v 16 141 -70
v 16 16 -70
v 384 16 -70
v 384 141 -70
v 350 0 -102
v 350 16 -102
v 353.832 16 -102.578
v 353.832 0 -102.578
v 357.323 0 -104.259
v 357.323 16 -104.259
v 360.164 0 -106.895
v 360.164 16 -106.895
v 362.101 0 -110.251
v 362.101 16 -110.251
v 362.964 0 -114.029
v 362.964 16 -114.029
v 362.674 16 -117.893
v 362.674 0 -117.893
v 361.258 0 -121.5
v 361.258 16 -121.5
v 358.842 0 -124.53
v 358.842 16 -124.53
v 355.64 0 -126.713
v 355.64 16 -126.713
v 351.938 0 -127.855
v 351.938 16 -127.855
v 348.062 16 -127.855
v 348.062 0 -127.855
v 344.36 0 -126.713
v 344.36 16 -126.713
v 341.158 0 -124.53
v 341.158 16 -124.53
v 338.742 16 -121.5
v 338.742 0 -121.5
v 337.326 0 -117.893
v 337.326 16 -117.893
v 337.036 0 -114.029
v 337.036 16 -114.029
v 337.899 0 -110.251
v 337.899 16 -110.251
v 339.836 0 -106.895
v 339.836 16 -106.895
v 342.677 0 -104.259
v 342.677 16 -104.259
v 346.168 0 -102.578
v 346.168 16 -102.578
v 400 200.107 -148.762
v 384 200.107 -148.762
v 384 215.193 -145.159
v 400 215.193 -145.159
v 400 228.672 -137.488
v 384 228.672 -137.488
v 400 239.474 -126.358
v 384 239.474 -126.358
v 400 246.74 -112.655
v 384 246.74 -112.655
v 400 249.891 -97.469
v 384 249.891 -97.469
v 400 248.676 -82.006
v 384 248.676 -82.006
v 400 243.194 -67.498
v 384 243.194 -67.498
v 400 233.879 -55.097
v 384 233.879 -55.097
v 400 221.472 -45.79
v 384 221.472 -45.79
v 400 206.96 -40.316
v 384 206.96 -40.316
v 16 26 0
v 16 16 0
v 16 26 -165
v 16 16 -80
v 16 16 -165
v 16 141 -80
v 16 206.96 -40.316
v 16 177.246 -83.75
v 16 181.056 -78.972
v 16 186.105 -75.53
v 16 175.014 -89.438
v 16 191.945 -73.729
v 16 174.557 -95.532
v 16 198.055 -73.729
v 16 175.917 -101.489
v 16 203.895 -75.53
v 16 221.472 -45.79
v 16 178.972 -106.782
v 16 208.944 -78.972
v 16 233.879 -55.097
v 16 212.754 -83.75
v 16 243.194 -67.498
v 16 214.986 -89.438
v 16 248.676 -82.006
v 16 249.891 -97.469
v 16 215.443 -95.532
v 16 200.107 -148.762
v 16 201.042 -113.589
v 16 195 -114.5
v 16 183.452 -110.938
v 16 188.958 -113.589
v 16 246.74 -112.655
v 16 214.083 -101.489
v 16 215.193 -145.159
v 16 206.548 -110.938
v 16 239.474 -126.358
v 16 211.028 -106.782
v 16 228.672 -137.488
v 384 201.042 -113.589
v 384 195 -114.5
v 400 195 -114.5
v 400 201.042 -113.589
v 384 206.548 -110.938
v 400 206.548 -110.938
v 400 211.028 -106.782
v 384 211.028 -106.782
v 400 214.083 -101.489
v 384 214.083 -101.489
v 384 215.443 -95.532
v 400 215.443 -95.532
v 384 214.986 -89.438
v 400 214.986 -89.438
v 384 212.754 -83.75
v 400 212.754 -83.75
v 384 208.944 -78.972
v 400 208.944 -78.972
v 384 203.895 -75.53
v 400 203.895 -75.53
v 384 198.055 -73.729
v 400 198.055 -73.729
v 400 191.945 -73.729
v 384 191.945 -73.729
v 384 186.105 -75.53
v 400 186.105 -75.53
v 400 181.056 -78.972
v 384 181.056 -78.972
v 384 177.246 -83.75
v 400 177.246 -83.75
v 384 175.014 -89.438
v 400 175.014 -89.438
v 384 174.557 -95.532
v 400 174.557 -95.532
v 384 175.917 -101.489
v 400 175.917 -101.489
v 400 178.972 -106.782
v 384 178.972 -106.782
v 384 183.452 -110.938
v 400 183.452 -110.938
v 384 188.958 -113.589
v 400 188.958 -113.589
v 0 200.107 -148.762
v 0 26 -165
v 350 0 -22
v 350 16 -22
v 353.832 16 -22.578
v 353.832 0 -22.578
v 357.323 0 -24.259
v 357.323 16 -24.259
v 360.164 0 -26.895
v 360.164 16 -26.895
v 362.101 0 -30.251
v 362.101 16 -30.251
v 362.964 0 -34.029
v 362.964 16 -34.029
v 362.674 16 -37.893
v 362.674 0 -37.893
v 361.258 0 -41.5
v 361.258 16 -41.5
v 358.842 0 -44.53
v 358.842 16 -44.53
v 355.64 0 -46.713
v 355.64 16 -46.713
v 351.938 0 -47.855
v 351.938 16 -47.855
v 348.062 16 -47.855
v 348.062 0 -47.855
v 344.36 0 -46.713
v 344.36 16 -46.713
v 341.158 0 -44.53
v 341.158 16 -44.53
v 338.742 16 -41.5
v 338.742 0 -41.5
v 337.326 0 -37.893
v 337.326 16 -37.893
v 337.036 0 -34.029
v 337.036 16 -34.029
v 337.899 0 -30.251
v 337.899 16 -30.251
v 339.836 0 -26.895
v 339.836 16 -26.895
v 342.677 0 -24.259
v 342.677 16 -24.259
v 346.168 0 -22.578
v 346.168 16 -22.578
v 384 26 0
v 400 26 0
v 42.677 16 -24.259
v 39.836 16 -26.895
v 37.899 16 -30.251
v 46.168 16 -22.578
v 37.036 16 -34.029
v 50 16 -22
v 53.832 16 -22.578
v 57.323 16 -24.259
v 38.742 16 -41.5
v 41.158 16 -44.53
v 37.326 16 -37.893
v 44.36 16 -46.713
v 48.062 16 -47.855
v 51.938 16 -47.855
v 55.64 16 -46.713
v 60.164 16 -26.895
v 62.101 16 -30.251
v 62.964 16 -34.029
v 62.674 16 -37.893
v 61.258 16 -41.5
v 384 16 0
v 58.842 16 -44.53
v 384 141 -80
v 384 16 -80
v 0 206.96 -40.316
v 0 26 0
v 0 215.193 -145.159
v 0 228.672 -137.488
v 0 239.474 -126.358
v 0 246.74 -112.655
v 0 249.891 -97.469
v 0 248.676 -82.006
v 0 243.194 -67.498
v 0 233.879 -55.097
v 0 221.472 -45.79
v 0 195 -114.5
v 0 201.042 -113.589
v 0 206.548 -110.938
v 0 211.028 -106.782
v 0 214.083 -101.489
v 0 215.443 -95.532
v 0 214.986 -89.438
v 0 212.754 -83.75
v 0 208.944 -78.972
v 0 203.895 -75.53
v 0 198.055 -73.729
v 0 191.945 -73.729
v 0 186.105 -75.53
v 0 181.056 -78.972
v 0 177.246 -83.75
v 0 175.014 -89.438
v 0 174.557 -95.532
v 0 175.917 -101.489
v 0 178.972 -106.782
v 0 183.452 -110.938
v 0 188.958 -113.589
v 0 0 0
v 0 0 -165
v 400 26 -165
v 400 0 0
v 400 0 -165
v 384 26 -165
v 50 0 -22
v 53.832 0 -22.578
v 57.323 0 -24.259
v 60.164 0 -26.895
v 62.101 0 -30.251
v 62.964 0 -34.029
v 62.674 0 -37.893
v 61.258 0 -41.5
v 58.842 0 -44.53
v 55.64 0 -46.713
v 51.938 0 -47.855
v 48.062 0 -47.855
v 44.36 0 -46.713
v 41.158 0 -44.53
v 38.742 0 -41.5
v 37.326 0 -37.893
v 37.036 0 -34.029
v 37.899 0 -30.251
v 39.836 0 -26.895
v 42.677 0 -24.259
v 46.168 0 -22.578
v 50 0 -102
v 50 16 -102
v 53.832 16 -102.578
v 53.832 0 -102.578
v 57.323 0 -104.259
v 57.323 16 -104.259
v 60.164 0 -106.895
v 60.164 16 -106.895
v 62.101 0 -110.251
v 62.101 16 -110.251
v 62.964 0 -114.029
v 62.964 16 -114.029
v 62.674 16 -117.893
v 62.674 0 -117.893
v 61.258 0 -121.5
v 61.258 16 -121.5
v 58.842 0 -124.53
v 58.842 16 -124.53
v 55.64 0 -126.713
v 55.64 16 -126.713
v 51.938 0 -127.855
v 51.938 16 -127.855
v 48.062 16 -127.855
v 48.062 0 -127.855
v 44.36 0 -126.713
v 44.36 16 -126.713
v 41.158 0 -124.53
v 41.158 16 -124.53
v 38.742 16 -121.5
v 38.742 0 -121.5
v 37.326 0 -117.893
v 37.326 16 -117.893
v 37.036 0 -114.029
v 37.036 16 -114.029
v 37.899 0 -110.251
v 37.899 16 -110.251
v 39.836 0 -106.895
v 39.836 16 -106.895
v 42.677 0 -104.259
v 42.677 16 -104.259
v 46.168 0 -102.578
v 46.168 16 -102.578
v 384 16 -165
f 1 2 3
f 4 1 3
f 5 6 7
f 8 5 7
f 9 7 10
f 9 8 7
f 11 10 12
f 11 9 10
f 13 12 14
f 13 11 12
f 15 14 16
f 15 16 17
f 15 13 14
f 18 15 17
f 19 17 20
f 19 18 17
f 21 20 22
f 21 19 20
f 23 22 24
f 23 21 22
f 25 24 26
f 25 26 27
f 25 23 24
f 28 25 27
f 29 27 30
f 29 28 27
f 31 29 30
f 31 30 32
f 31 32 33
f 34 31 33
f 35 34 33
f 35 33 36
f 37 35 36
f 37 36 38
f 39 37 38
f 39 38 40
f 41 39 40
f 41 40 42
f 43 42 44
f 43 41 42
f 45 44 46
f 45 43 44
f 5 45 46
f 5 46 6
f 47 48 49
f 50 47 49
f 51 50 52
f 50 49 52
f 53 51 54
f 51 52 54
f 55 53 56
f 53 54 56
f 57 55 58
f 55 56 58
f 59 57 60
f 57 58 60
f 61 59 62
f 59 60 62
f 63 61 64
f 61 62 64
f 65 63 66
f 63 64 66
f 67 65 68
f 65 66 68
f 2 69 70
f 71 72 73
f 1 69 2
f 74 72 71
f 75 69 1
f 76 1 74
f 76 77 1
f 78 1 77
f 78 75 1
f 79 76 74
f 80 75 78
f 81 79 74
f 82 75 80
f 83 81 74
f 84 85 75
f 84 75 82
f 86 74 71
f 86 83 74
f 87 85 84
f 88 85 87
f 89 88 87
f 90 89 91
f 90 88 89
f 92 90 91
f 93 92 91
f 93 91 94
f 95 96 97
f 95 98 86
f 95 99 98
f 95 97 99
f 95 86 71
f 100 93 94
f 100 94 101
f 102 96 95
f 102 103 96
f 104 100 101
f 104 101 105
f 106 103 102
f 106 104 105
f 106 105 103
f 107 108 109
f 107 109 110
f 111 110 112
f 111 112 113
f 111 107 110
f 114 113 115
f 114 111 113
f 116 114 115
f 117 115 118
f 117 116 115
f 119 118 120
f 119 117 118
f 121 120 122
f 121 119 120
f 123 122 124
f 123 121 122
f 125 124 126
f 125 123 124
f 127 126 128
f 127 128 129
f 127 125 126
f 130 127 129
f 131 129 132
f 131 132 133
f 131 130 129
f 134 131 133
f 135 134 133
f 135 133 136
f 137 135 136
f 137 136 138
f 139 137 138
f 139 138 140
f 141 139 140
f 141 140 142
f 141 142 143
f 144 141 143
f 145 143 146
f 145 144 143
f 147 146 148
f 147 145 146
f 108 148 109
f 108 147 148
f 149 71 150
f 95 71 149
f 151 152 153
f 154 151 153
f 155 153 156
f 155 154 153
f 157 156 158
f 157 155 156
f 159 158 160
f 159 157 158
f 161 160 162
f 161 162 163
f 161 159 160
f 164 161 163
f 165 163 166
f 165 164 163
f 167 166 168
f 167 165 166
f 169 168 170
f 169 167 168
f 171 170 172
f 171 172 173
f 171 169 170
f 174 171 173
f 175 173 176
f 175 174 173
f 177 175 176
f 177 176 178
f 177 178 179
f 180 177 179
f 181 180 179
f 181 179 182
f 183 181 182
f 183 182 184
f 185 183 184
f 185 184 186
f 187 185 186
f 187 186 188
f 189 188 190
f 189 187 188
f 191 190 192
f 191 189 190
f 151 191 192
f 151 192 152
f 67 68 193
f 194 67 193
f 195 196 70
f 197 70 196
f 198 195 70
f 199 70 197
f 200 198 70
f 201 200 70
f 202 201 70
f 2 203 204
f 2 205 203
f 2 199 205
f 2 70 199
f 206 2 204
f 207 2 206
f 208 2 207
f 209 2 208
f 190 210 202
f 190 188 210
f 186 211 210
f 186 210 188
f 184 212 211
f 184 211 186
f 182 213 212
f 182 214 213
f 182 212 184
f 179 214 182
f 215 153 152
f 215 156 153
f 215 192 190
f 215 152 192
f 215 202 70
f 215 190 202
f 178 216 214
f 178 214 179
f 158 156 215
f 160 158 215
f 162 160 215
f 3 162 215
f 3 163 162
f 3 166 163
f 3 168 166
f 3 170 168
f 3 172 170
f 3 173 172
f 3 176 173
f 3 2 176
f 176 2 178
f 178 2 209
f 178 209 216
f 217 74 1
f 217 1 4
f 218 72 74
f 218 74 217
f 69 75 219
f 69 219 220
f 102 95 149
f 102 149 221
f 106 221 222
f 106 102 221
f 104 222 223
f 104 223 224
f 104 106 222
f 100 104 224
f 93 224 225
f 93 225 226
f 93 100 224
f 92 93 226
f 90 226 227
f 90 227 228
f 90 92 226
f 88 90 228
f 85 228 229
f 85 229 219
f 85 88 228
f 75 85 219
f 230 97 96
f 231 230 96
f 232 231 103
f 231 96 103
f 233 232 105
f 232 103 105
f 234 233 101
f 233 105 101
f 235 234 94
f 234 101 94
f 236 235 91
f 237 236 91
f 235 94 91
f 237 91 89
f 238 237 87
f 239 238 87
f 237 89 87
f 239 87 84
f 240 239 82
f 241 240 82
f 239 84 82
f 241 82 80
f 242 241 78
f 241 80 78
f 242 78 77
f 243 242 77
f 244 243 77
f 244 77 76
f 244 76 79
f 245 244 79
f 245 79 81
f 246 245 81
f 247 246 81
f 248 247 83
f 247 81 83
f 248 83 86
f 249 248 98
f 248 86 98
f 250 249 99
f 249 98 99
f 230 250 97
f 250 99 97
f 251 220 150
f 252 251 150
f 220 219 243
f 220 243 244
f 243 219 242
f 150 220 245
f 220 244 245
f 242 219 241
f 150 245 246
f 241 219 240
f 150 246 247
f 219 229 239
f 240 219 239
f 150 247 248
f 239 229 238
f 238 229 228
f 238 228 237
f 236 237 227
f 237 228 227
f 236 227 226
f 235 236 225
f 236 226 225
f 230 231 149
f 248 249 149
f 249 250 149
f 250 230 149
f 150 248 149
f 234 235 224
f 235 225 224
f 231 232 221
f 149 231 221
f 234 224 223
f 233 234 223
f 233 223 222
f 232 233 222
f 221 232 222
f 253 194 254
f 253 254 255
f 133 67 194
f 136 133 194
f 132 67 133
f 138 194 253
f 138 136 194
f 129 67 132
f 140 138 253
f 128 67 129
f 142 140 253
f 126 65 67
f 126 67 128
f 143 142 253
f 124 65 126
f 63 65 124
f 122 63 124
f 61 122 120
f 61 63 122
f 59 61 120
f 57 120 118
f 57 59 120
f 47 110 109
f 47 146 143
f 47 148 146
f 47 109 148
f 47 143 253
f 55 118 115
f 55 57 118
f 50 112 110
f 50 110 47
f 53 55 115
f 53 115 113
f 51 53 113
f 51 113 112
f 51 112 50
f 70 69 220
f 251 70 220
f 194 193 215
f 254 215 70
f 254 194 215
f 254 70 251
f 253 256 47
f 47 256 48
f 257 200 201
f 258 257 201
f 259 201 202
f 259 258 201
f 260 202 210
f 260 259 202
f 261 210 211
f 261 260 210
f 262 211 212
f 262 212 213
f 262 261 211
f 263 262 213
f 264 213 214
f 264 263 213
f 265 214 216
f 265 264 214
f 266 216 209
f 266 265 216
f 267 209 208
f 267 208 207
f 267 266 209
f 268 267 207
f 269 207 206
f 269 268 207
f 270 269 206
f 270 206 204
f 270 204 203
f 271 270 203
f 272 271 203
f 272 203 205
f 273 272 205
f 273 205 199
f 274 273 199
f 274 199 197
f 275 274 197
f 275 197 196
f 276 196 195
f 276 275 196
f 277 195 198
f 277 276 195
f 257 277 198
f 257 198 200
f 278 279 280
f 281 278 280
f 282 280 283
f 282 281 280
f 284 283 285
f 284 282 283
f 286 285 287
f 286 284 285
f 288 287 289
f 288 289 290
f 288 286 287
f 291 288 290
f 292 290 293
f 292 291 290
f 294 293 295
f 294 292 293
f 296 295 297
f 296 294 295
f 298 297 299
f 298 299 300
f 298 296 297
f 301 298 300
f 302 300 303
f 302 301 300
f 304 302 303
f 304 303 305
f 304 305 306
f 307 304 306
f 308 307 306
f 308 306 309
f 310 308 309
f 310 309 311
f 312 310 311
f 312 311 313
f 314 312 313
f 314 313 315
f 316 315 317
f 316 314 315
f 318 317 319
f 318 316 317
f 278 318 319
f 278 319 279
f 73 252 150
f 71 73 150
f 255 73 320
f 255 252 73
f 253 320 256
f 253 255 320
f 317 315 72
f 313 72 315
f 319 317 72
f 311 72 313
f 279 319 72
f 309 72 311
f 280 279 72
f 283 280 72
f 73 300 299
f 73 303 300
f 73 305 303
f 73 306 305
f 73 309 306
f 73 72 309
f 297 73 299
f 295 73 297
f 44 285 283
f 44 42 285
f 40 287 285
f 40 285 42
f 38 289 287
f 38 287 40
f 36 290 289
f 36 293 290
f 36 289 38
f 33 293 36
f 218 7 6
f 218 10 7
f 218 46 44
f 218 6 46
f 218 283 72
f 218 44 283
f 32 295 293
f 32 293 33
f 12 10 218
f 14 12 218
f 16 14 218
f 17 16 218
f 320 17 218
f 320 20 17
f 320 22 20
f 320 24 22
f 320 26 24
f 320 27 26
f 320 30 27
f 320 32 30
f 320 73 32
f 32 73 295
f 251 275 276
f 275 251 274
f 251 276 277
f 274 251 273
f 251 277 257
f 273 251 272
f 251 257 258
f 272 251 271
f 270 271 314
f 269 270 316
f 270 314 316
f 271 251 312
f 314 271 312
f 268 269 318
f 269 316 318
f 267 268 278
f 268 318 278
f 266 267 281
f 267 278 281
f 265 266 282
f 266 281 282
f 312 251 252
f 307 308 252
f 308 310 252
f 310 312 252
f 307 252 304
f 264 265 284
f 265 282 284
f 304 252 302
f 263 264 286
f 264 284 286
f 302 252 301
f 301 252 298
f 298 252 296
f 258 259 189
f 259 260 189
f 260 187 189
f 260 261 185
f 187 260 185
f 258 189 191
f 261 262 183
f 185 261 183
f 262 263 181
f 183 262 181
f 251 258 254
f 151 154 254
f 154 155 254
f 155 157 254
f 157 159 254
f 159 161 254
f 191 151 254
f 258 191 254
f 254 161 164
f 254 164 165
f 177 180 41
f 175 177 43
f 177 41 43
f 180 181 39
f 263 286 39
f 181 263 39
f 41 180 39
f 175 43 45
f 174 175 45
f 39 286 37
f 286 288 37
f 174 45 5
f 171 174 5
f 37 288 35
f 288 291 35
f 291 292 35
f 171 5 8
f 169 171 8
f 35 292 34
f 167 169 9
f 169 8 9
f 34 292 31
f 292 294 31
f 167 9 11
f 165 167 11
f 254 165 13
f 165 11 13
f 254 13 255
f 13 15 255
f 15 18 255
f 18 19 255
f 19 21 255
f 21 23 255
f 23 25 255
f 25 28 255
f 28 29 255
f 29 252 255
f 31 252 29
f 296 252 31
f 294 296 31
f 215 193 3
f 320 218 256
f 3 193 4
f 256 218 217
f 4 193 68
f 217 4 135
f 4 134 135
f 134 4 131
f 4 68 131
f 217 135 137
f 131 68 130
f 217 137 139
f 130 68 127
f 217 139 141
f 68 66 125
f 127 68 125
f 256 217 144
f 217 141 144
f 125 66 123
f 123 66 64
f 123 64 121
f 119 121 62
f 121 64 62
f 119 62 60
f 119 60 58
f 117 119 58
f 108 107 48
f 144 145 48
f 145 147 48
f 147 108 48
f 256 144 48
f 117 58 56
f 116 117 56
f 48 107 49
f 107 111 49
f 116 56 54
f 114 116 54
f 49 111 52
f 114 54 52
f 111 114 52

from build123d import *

# Parameters (mm, degrees)
SKETCH_1_W      = 400
SKETCH_1_H      = 165
SKETCH_1_R      = 13
EXTRUDE_1_DEPTH = 16
SKETCH_2_W      = 368
SKETCH_2_H      = 10
EXTRUDE_2_DEPTH = 125
SKETCH_3_R      = 20.5
EXTRUDE_3_DEPTH = 16


with BuildPart() as part:
    # 草图1 → 凸台-拉伸1 (new body)
    with BuildSketch(Plane(origin=(0, 0, 0), x_dir=(1, 0, 0), z_dir=(0, 1, 0))):
        with Locations((200, 82.5)):
            Rectangle(SKETCH_1_W, SKETCH_1_H)
        with Locations(Location((350, 115, 0), (0, 0, 270))):
            Circle(SKETCH_1_R, mode=Mode.SUBTRACT)
        with Locations(Location((50, 115, 0), (0, 0, 270))):
            Circle(SKETCH_1_R, mode=Mode.SUBTRACT)
        with Locations(Location((50, 35, 0), (0, 0, 270))):
            Circle(SKETCH_1_R, mode=Mode.SUBTRACT)
        with Locations(Location((350, 35, 0), (0, 0, 270))):
            Circle(SKETCH_1_R, mode=Mode.SUBTRACT)
    extrude(amount=EXTRUDE_1_DEPTH)

    # 草图2 → 凸台-拉伸2 (add)
    with BuildSketch(Plane(origin=(0, 16, 0), x_dir=(1, 0, 0), z_dir=(0, 1, 0))):
        with Locations((200, 75)):
            Rectangle(SKETCH_2_W, SKETCH_2_H)
    extrude(amount=EXTRUDE_2_DEPTH)

    # 草图3 → 凸台-拉伸3 (add)
    with BuildSketch(Plane(origin=(384, 0, 0), x_dir=(0, 0, -1), z_dir=(1, 0, 0))):
        with BuildLine():
            Line((165, 16), (165, 26))
            Line((165, 26), (148.762358111, 200.107262875))
            ThreePointArc((148.762358111, 200.107262875), (97.468660954, 249.890512761), (40.316177192, 206.960232804))
            Line((40.316177192, 206.960232804), (0, 26))
            Line((0, 26), (0, 16))
            Line((0, 16), (165, 16))
        make_face()
        with Locations((94, 195)):
            Circle(SKETCH_3_R, mode=Mode.SUBTRACT)
    extrude_3 = extrude(amount=EXTRUDE_3_DEPTH)

    # 镜向1: 凸台-拉伸3 across plane
    add(extrude_3.mirror(Plane(origin=(200, 0, 0), x_dir=(0, 0, 1), z_dir=(1, 0, 0))))


solid = part.part
